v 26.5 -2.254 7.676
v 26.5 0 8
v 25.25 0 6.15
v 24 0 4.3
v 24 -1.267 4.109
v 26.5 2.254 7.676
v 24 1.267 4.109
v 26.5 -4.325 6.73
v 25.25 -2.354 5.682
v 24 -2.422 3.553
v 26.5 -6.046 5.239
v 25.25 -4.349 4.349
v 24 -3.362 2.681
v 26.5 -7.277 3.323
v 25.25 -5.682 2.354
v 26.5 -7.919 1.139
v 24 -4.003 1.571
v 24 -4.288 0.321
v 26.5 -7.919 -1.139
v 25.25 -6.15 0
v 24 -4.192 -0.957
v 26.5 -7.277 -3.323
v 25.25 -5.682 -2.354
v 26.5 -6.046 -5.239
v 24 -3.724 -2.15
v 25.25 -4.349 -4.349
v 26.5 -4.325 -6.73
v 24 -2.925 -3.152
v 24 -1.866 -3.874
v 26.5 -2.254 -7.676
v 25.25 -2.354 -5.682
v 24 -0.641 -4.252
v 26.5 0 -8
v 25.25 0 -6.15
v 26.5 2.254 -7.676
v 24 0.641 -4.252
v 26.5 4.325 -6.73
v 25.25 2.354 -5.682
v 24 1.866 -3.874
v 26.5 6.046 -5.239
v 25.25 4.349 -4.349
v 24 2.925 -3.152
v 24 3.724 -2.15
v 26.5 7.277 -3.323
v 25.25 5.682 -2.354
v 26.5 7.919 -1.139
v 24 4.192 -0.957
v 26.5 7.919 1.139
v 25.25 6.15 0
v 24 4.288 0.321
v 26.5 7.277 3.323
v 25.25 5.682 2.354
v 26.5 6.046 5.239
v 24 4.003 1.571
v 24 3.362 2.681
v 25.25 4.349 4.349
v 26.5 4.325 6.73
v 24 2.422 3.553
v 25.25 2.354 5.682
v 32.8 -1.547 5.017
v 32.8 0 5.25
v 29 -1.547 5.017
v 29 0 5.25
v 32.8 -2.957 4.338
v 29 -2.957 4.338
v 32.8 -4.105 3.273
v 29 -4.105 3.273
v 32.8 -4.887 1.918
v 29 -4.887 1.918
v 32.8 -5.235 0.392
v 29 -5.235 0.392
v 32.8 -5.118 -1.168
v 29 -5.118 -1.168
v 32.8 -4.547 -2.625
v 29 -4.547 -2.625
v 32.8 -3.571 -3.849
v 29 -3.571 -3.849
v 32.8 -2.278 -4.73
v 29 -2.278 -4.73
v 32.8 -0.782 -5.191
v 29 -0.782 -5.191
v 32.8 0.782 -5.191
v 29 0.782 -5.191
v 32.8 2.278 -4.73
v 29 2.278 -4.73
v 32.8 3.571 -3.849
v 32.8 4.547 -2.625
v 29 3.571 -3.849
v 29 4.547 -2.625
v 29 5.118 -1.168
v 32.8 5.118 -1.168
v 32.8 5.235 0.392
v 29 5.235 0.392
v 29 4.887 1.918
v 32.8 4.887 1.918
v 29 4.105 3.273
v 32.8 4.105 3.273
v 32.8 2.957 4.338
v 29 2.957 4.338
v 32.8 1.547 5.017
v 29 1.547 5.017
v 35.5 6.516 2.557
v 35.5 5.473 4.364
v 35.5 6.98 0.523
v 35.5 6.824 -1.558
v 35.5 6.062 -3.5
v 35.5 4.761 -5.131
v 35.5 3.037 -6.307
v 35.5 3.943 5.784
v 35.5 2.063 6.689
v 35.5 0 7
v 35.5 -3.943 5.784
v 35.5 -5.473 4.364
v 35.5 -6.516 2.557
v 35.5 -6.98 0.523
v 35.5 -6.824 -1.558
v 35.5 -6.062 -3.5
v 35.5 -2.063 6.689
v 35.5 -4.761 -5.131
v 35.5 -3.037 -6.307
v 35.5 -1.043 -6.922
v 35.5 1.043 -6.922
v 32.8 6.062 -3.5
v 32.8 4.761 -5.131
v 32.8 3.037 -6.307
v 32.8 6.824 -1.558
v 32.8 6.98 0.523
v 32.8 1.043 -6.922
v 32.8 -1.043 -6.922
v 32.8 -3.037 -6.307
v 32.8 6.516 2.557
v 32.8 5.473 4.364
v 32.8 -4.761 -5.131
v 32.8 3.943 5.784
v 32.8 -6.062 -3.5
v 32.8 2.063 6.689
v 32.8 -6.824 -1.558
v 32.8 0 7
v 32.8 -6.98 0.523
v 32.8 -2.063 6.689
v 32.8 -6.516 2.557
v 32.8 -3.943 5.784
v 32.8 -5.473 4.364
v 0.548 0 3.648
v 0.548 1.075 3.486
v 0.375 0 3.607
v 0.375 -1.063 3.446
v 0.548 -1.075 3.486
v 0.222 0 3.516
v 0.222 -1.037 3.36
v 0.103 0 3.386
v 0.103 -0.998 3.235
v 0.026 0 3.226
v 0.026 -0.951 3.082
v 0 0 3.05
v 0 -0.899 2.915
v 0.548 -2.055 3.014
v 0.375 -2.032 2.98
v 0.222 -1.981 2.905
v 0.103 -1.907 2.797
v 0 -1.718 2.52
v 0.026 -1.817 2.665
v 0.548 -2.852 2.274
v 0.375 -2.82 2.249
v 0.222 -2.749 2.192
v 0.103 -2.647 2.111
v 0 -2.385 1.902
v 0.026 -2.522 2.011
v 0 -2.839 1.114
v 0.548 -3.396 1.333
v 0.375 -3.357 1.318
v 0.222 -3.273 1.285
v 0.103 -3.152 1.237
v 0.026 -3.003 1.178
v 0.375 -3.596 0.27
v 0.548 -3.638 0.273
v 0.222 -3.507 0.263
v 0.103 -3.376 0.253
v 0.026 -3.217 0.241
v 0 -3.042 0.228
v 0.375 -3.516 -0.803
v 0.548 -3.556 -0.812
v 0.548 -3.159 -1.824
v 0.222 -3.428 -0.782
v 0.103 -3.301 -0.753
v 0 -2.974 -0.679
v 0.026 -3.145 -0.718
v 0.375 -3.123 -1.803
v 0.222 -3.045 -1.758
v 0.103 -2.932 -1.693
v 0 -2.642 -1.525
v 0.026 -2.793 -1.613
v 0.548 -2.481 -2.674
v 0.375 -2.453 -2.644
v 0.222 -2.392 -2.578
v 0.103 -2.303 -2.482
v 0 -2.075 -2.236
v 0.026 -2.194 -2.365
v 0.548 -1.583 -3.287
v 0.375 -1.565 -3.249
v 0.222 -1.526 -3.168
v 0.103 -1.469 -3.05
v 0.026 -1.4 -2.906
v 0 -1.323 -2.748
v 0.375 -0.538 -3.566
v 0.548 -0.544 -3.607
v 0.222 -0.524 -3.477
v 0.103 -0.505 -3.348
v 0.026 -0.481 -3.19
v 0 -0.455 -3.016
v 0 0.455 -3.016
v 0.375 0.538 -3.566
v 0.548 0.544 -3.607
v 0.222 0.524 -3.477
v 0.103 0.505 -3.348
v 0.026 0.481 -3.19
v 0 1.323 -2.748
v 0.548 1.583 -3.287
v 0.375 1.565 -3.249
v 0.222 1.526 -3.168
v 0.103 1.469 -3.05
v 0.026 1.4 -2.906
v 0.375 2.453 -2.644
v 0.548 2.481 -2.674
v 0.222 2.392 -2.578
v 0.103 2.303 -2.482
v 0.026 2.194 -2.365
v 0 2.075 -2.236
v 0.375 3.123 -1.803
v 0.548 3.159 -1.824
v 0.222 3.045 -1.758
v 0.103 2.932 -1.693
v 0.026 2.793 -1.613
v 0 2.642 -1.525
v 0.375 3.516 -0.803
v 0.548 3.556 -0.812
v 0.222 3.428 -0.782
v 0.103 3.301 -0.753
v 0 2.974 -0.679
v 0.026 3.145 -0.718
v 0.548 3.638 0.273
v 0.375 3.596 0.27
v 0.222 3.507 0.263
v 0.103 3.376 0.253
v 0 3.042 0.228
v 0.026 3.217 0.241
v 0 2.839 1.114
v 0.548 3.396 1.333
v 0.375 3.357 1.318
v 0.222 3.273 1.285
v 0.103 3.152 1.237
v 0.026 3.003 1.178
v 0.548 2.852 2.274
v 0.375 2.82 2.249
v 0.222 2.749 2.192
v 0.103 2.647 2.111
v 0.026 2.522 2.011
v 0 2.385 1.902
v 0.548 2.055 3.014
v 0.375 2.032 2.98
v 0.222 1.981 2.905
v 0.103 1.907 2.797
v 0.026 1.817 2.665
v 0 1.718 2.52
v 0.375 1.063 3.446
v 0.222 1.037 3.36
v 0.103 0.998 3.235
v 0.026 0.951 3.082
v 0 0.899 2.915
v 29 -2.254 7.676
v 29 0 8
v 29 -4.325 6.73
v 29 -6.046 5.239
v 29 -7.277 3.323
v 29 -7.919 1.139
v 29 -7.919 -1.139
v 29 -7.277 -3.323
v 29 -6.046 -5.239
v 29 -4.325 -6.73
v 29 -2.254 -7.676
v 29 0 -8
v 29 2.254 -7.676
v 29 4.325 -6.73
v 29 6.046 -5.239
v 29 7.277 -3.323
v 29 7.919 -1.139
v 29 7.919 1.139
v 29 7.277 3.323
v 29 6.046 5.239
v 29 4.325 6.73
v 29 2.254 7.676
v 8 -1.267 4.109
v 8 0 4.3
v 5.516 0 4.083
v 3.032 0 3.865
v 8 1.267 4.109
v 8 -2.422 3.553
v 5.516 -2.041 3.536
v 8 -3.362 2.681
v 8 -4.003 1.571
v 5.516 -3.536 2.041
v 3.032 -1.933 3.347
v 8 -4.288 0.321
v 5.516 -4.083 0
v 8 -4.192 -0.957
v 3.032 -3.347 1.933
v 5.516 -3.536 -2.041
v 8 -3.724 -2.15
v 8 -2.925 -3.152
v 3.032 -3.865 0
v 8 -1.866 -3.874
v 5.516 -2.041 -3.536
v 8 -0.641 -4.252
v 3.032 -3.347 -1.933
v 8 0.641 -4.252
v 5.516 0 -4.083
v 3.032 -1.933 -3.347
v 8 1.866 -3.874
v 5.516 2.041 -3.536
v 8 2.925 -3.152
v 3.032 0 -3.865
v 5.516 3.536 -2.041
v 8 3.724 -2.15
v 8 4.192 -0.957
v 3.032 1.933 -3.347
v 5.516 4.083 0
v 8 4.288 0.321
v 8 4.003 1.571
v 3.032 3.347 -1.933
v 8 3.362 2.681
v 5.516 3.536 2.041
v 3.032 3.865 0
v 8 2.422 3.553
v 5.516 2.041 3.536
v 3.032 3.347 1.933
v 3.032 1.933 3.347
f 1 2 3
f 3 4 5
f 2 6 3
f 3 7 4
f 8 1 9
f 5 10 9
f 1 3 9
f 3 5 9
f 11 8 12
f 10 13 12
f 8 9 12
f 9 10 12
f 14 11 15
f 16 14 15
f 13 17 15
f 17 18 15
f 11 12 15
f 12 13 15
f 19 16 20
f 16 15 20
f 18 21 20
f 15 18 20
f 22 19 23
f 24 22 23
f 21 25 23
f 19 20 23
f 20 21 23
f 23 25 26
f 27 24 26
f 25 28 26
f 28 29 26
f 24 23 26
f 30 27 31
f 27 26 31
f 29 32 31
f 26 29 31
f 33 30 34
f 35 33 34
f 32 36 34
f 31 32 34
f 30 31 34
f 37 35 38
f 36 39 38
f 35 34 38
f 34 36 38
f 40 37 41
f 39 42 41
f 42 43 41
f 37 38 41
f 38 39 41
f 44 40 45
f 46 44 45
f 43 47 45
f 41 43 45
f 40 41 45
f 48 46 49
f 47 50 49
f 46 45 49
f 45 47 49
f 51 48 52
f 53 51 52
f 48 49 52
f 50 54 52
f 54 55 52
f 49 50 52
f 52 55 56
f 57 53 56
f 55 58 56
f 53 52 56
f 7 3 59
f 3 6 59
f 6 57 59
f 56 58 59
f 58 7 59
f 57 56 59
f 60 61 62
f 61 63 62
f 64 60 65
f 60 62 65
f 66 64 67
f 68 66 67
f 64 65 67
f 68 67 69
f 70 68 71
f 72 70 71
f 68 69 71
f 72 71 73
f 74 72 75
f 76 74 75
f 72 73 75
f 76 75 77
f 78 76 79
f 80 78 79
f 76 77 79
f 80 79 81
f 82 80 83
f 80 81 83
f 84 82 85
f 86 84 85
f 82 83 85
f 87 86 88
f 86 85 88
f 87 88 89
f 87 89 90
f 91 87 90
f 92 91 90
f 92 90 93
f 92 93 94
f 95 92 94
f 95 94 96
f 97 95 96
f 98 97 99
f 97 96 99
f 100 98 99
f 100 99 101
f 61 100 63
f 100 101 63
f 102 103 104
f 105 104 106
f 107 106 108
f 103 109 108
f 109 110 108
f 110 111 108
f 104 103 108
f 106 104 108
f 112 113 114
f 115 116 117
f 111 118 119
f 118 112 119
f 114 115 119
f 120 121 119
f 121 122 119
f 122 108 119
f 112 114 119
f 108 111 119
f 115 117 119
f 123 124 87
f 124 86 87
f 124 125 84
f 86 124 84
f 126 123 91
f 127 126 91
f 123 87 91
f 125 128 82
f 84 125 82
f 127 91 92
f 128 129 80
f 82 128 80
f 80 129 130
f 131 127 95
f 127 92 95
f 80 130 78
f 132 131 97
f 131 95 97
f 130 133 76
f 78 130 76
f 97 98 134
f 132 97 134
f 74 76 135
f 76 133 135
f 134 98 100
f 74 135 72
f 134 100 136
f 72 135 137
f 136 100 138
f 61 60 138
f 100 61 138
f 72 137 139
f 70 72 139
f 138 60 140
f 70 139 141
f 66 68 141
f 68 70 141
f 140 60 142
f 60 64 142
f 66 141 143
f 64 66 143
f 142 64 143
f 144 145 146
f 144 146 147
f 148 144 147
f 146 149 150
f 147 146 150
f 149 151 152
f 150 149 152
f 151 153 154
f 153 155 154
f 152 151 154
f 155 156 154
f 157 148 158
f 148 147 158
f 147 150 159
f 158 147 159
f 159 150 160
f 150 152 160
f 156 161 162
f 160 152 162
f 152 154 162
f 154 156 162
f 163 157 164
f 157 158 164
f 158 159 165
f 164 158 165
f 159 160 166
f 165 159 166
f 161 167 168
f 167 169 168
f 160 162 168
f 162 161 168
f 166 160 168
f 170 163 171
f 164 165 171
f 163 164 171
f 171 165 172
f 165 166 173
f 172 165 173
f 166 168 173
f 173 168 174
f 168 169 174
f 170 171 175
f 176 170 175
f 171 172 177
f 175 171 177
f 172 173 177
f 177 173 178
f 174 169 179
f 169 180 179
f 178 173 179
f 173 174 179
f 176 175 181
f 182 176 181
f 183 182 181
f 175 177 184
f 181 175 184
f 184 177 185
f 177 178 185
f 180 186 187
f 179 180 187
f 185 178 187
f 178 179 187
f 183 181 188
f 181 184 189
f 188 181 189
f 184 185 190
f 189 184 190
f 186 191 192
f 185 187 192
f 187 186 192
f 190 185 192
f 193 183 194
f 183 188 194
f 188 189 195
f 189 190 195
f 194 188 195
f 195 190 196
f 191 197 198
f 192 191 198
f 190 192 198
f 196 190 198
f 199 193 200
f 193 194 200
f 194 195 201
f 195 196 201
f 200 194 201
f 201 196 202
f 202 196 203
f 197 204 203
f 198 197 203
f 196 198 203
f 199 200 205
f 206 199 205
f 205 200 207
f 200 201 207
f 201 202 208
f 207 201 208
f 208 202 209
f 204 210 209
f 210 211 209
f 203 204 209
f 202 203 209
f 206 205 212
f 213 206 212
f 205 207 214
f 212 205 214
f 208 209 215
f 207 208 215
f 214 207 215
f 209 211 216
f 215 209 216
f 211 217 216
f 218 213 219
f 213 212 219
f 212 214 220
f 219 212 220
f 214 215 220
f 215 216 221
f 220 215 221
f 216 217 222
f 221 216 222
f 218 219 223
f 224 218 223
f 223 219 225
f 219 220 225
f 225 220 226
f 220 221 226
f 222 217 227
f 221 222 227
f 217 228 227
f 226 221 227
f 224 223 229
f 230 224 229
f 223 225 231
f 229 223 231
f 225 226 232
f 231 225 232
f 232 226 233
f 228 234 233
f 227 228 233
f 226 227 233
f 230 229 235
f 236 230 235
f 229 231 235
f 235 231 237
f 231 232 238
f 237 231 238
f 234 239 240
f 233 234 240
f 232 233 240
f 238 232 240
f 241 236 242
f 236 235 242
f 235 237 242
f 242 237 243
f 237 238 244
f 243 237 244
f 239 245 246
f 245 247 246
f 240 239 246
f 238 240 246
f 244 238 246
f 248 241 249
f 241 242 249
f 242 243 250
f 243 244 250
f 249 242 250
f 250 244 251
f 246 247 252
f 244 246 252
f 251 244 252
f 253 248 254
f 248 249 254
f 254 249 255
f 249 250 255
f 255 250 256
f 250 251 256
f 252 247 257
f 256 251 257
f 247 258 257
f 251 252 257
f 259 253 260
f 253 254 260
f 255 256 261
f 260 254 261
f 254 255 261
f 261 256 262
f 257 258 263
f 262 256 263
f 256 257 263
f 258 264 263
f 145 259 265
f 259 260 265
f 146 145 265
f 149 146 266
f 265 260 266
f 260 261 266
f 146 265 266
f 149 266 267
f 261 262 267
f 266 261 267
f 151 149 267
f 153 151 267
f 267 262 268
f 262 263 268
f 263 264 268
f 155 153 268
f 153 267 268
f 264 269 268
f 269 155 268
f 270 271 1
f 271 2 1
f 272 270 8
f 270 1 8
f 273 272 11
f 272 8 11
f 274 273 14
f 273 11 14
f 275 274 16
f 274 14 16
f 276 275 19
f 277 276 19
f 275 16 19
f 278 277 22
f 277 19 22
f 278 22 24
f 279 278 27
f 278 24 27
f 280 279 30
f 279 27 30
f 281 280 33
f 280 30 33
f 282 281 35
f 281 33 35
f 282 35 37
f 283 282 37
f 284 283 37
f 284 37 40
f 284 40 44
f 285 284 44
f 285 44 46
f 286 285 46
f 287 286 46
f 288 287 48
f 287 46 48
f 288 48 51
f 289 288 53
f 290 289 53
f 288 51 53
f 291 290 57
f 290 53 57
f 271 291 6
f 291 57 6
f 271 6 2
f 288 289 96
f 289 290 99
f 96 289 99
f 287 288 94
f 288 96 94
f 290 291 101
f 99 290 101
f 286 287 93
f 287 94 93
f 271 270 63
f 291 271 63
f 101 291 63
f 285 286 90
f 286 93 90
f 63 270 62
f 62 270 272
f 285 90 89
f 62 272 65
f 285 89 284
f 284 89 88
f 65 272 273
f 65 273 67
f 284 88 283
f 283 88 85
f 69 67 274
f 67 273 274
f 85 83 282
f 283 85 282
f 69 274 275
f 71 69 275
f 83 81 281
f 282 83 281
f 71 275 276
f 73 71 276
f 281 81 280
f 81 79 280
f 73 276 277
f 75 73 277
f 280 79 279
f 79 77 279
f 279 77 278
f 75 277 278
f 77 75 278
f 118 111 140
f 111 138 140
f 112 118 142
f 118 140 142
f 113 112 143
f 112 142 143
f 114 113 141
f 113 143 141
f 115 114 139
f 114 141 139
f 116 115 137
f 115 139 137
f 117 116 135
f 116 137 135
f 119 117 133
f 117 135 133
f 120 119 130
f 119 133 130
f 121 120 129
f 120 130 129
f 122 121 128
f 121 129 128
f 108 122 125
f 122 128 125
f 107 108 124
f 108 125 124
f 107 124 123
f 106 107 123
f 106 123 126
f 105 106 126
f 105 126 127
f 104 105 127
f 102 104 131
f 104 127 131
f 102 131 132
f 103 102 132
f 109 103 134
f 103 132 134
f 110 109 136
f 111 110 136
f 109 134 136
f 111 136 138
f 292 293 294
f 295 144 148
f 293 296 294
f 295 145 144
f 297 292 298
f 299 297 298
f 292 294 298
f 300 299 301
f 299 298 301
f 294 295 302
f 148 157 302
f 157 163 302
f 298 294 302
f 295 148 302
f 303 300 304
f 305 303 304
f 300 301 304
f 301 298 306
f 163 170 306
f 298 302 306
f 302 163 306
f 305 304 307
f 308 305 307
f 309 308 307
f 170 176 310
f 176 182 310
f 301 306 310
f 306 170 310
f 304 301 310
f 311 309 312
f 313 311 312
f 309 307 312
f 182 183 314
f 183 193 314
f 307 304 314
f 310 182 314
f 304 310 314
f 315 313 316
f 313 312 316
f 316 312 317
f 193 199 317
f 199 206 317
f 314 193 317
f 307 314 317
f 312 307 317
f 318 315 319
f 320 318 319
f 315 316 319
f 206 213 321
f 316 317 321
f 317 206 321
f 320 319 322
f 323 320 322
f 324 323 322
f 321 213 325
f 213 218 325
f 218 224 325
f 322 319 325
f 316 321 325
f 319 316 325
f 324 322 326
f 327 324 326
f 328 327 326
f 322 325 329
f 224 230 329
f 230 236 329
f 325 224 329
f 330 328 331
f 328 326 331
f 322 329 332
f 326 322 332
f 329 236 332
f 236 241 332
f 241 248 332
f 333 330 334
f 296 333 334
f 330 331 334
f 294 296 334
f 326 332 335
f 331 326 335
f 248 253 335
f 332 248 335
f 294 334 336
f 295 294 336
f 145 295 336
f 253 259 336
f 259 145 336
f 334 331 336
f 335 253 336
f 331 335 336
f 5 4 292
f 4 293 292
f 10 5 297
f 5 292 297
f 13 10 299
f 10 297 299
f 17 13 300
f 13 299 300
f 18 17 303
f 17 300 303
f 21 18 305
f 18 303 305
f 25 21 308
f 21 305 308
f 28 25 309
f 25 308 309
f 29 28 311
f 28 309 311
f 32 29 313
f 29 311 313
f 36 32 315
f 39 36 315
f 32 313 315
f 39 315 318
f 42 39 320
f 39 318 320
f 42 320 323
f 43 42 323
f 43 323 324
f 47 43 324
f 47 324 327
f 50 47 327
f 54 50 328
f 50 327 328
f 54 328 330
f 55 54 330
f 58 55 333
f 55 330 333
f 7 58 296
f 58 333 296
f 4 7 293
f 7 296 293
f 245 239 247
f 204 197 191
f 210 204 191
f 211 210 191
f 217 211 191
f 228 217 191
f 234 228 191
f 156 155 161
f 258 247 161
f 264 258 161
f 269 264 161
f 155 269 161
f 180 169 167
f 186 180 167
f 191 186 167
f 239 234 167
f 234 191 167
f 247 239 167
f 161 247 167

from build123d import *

# Parameters (mm, degrees)
FILETE1_R = 0.6


with BuildPart() as part:
    # Esboço1 → Revolução1 (revolve)
    with BuildSketch(Plane.XY, mode=Mode.PRIVATE) as revolu_o1_sk:
        Polygon((35.5, 0), (35.5, 7), (32.8, 7), (32.8, 5.25), (29, 5.25), (29, 8), (26.5, 8), (24, 4.3), (8, 4.3), (0, 3.6), (0, 0), align=None)
    revolve(revolu_o1_sk.sketch.rotate(Axis((0, 0, 0), (1, 0, 0)), 90), axis=Axis((0, 0, 0), (1, 0, 0)))

    # Filete1
    filete1_edges = [part.edges().sort_by_distance(p)[0] for p in [
        (0, 0, -3.6),
    ]]
    fillet(filete1_edges, radius=FILETE1_R)


solid = part.part
